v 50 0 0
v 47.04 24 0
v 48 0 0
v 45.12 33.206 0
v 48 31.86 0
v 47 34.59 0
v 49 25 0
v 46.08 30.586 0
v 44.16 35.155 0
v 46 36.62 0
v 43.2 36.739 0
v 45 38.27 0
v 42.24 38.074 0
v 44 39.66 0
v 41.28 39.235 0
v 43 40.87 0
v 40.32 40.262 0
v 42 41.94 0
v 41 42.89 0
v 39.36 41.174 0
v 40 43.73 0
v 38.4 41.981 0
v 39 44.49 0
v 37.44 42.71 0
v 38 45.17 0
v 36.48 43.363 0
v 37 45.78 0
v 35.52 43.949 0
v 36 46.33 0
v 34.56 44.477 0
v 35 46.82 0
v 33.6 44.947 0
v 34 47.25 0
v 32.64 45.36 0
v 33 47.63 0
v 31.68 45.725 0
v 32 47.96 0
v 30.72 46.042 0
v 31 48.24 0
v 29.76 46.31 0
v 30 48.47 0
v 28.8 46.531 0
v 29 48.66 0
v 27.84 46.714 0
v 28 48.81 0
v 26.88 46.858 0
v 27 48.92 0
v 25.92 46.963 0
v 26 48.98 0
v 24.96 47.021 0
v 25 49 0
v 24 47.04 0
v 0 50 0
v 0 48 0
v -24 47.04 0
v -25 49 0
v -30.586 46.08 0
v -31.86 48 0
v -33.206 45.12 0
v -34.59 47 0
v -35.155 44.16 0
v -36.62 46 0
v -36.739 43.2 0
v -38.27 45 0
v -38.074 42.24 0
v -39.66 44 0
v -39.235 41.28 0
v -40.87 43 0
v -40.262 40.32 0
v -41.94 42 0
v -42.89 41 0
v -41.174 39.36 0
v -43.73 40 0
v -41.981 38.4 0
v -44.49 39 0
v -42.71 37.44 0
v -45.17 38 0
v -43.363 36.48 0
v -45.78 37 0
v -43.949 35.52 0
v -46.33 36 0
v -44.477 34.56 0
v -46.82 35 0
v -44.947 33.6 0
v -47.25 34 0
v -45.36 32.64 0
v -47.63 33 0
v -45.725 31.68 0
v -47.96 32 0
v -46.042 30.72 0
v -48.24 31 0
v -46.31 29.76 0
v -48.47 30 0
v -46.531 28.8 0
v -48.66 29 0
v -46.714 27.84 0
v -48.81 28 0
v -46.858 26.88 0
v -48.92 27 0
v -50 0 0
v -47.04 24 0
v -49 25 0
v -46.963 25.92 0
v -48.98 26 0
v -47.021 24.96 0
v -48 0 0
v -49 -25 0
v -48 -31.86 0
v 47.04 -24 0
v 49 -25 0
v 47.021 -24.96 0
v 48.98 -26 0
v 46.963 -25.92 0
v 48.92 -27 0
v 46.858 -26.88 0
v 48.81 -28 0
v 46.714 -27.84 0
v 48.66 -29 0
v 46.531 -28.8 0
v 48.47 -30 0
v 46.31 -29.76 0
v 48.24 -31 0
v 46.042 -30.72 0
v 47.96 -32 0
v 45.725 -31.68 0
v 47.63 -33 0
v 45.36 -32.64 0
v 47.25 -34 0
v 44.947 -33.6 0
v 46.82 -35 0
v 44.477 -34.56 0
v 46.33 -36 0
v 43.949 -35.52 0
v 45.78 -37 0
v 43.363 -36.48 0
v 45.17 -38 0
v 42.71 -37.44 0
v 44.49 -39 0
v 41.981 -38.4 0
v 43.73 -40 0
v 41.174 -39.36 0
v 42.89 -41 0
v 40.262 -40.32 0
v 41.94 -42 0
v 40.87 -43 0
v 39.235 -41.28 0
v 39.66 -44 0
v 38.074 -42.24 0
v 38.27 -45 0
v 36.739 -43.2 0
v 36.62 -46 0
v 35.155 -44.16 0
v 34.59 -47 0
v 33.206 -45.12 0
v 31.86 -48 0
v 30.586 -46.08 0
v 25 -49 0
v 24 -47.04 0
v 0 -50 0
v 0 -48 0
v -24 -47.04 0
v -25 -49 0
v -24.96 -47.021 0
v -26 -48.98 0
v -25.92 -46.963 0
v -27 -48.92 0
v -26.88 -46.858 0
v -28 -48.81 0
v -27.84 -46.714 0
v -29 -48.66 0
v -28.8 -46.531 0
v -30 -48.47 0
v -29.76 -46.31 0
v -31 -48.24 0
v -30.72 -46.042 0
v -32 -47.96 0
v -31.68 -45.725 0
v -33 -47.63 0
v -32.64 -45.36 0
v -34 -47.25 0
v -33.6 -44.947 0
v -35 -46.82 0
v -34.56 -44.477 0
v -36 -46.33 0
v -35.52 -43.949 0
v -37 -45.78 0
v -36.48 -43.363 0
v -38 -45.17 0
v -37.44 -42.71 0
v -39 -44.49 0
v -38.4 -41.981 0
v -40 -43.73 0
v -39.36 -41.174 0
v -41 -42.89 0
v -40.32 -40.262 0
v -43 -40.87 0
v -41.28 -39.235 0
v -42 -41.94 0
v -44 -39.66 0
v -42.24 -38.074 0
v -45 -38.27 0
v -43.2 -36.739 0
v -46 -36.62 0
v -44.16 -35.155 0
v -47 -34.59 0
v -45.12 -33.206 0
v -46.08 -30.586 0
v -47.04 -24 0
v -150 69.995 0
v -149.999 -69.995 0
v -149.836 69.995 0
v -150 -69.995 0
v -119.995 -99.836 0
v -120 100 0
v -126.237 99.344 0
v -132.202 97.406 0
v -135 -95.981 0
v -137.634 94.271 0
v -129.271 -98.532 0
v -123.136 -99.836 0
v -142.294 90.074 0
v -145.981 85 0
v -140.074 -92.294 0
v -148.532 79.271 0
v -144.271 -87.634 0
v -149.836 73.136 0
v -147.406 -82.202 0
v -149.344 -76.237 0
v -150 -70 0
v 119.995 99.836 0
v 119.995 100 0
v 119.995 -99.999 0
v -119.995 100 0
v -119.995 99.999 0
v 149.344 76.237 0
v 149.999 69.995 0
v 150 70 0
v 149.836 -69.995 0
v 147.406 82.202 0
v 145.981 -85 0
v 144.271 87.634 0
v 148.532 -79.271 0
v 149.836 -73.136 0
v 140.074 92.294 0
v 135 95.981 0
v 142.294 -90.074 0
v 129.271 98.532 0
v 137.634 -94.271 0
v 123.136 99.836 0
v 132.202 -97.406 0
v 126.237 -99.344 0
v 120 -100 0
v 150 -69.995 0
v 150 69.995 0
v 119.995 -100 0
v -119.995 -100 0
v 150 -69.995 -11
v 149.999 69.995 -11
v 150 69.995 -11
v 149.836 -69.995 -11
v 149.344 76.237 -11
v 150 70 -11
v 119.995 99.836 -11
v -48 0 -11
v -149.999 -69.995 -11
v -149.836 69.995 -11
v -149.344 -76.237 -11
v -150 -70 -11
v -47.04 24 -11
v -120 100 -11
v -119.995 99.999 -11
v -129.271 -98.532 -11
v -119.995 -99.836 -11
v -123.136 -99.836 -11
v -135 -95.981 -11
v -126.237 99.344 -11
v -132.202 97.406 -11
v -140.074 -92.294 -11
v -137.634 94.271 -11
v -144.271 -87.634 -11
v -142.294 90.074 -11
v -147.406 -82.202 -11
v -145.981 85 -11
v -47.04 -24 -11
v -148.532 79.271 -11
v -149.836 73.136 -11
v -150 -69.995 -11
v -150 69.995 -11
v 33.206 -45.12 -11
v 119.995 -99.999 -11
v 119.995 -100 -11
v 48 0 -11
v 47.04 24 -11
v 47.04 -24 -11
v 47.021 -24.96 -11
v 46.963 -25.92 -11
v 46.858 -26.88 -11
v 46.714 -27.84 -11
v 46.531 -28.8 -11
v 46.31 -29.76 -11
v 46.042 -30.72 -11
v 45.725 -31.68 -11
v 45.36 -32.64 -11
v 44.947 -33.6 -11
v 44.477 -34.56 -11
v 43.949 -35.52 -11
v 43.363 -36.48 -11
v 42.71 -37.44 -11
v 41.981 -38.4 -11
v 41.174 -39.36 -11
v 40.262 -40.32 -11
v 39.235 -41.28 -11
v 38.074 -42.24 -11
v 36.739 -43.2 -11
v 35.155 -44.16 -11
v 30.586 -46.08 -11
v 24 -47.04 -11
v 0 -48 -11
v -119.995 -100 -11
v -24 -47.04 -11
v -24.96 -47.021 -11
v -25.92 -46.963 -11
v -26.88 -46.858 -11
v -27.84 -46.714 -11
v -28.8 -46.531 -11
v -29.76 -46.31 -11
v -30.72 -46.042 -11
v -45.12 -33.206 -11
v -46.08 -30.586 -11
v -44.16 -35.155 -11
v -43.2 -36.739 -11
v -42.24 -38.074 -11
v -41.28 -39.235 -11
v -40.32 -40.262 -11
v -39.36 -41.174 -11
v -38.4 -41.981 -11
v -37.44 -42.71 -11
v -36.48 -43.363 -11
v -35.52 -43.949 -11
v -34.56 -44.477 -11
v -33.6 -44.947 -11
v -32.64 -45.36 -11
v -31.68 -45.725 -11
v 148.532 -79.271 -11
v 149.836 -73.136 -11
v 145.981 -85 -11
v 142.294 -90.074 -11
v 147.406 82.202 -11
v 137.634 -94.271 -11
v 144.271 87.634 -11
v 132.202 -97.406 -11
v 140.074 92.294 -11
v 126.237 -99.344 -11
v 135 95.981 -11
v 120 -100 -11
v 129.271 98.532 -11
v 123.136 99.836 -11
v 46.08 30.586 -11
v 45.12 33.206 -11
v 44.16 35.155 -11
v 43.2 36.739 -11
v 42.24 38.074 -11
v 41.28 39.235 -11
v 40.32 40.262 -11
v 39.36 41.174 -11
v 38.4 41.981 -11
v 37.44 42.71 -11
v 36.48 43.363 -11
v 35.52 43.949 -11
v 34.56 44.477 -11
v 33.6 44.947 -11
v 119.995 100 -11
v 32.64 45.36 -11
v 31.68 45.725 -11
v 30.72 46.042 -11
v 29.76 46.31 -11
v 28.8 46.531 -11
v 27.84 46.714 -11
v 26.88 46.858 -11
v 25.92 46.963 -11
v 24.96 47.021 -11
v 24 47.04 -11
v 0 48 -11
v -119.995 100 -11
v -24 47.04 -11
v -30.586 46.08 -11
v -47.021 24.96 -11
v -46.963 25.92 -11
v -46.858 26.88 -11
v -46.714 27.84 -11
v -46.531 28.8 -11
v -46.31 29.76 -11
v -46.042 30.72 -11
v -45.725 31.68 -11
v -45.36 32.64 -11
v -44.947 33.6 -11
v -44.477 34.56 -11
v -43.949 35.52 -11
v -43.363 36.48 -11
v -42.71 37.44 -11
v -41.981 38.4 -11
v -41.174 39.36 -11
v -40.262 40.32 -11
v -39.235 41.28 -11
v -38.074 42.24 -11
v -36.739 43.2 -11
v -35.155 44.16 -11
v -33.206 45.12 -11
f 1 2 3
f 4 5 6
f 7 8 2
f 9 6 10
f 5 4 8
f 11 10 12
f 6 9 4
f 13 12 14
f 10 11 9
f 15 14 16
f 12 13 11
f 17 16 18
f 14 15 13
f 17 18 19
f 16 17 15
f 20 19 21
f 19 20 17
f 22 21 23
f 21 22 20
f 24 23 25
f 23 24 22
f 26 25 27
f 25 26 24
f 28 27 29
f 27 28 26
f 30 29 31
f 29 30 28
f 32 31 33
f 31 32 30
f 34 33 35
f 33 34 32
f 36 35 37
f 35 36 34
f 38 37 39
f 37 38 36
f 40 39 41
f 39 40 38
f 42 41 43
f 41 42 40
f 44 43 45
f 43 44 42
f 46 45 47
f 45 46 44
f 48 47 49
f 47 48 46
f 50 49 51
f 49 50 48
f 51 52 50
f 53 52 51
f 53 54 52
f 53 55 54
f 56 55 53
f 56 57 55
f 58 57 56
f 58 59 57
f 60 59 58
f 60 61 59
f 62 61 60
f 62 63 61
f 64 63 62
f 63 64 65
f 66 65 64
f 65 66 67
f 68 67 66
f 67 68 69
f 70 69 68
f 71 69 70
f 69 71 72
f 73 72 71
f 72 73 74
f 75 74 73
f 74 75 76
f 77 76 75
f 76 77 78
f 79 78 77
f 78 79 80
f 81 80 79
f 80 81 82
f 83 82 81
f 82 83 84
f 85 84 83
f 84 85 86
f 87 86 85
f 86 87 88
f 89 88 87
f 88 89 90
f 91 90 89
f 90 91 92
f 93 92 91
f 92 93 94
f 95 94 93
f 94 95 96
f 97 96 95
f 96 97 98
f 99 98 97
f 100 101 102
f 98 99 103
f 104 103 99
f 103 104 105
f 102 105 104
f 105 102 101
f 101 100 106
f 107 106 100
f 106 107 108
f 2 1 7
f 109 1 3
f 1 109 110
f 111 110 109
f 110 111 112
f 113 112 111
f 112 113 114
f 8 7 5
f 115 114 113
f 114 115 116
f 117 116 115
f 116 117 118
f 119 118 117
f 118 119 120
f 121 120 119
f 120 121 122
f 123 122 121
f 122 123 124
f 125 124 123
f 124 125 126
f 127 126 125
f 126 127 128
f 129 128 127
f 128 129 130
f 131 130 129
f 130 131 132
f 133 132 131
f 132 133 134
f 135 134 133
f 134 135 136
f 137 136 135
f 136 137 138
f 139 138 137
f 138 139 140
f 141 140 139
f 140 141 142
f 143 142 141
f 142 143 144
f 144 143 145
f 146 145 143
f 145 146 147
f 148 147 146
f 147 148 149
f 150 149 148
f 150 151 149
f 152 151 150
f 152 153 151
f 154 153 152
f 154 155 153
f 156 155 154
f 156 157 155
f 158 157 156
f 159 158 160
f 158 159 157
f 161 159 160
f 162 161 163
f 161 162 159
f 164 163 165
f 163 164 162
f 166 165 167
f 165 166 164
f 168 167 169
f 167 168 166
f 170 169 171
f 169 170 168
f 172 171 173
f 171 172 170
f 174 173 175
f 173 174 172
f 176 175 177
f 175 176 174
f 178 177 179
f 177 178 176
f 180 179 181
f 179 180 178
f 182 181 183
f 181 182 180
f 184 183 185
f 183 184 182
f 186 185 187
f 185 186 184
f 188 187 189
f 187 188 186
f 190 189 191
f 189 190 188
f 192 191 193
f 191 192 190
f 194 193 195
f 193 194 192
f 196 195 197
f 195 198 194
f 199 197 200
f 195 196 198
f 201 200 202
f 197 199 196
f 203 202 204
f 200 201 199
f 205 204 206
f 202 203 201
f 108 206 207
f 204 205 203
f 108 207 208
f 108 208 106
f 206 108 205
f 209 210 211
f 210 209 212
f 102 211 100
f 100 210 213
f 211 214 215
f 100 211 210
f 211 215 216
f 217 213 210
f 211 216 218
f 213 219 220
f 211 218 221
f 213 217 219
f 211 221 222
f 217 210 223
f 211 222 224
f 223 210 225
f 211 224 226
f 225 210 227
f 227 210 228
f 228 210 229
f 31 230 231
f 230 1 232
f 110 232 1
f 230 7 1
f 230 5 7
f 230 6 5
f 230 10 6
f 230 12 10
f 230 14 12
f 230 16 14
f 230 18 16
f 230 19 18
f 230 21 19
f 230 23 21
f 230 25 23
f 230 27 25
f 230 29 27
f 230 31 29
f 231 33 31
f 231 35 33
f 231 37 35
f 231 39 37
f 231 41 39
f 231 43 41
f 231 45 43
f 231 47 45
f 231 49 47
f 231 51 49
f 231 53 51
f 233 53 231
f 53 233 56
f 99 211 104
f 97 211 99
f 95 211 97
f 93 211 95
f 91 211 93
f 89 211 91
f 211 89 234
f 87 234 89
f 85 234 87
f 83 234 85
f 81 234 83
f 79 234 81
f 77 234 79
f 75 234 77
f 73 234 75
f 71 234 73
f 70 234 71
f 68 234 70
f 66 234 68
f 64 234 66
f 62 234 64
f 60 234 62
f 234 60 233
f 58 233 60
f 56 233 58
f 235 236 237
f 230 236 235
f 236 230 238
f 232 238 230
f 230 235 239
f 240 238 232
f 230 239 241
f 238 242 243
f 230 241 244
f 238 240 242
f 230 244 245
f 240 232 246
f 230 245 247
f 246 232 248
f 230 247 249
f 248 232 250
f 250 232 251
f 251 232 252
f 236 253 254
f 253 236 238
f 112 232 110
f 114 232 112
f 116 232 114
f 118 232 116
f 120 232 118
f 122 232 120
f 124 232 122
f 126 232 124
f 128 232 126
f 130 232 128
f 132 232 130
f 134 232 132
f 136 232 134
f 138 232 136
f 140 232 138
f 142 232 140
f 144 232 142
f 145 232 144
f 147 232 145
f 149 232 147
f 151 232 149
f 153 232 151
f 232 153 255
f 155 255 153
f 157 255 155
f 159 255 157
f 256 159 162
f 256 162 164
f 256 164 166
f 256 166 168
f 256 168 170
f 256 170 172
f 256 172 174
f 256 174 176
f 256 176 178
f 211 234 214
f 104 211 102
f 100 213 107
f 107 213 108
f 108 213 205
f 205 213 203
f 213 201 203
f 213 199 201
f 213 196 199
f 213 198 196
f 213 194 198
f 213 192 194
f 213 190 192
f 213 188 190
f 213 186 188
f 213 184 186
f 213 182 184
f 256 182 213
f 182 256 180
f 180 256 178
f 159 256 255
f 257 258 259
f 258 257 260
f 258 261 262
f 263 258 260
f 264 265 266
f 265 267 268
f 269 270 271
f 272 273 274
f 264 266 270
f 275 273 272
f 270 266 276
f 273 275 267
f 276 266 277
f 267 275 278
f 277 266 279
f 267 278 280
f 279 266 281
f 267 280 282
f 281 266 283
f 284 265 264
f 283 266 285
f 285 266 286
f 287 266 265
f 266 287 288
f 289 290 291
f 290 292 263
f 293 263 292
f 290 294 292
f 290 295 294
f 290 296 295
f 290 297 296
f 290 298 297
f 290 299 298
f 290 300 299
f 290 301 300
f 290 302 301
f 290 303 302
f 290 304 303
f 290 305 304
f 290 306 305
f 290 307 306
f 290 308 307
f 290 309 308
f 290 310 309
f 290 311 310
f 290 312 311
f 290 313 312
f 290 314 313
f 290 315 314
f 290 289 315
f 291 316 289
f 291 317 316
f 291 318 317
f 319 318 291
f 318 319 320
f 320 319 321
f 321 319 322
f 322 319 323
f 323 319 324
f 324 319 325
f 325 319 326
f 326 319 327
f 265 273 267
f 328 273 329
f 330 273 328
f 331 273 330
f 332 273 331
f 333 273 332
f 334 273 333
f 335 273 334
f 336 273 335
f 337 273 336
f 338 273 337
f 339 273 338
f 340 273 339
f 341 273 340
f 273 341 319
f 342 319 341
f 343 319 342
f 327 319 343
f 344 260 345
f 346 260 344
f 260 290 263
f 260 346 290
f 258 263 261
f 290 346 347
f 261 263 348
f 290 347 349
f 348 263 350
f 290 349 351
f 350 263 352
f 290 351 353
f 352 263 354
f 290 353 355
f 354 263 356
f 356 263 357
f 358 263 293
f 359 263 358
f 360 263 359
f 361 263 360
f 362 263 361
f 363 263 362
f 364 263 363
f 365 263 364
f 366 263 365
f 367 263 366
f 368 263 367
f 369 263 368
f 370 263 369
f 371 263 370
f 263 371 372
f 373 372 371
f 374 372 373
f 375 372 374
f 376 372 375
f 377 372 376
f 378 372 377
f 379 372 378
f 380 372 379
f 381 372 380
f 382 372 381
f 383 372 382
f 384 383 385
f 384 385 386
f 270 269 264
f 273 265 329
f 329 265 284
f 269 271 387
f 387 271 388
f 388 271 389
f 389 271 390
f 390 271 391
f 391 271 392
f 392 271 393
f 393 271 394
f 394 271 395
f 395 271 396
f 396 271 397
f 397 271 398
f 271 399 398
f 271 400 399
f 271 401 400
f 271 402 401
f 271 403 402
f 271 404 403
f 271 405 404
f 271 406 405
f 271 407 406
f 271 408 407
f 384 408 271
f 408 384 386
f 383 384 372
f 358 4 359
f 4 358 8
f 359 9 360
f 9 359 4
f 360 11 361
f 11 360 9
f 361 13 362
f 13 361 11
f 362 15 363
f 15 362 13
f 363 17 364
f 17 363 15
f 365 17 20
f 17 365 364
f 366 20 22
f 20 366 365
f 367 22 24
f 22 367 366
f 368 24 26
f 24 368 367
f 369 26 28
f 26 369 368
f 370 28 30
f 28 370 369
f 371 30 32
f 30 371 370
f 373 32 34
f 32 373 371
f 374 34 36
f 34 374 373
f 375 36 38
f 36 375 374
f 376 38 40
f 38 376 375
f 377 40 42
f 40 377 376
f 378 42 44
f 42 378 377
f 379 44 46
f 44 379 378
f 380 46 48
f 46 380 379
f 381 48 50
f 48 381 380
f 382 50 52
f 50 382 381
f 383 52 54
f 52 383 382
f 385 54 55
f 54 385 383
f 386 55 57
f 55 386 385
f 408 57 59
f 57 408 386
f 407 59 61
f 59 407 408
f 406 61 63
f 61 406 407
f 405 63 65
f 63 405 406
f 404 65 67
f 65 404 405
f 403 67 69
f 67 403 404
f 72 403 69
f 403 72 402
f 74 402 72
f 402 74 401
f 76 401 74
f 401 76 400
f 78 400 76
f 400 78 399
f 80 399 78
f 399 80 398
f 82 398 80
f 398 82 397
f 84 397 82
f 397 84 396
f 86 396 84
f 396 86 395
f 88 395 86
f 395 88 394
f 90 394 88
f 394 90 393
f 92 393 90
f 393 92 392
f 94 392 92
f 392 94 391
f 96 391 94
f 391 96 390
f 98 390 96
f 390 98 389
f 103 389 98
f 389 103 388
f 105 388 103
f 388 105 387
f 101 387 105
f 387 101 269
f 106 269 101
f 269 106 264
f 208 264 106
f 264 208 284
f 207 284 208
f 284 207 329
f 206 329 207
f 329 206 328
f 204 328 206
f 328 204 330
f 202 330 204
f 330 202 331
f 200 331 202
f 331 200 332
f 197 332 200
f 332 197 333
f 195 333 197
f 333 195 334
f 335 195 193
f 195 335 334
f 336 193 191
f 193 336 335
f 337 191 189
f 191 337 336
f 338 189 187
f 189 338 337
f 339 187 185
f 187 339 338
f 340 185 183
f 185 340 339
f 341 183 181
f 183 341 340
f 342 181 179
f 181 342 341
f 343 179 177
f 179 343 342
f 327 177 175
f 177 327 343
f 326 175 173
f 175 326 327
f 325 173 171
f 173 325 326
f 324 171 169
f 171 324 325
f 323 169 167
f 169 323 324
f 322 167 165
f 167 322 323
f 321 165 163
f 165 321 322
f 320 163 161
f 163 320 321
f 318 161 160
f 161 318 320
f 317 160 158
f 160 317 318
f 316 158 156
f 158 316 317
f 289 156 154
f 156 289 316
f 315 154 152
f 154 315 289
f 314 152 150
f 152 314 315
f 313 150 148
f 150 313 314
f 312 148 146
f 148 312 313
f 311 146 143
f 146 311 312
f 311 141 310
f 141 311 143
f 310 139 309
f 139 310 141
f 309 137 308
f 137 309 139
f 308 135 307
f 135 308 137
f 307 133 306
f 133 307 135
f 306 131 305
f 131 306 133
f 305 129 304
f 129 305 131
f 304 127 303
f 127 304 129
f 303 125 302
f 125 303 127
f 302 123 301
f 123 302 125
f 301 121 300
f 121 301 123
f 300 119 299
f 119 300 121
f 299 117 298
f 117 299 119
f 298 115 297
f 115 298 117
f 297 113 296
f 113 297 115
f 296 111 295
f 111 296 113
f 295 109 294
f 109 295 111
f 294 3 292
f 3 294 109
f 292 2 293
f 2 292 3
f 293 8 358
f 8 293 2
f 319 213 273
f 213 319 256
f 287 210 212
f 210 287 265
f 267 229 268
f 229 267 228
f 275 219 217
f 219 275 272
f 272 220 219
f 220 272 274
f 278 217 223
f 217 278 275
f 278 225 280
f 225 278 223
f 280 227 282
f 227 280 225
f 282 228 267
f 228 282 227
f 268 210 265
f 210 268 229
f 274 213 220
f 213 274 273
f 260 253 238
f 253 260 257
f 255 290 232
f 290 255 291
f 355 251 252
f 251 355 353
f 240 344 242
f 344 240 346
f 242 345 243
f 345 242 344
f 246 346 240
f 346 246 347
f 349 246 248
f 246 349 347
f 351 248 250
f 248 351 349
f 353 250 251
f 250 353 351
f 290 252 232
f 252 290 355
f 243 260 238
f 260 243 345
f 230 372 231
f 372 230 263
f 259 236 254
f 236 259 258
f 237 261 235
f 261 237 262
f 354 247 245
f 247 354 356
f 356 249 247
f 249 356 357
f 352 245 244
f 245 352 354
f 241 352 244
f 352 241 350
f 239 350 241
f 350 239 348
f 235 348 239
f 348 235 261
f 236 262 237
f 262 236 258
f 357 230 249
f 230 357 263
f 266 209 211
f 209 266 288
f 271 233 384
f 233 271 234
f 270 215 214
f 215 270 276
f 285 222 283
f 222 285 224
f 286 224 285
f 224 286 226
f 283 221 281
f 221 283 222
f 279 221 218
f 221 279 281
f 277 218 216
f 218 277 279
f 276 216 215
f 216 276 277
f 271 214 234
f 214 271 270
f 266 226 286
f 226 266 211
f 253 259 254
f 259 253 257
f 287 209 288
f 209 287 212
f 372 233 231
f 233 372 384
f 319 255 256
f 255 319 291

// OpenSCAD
// file: ecobee.scad
module ecobee_corner() {
    // The ecobee3 shape is a rounded(ish) square. It can be split up
    // into four quadrants. To generate the outline of the upper right
    // quadrant, start at [0, 50], and connect to the top edge of a 24mm
    // radius circle centered at [25, 25]. Follow the outline of that
    // circle until its y-value hits 25, and then connect to [50, 0]. 
    // Because OpenSCAD can't generate an array of points like this by
    // executing a function for each x-value, these points were generated
    // by a separate PHP script:
    // <?php
    // 
    // function y( $x ) {
    //     return ( 1/$x ) + 50;
    // }
    // 
    // $r = 24;
    // $h = 25;
    // $k = 25;
    // $a = 1;
    // $b = -2 * $k;
    // $points = array();
    // $points[] = '[0, 0]';
    // $points[] = '[0, 50]';
    // 
    // for ( $x = 25; $x <= 49; $x++ ) {
    //     $c = -($r * $r) + ($k * $k) + (($x - $h) * ($x - $h));
    // 
    //     $d = ($b*$b) - (4*$a*$c);
    // 
    //     $y = ( ( -$b + sqrt( $d ) ) / ( 2 * $a ) );
    // 
    //     $points[] = '[' . $x . ', ' . round( $y, 2 ) . ']';
    // }
    // 
    // $points[] = '[50, 0]';
    // 
    // echo '[ ' . join( ", ", $points ) . ' ]';
    points = [ [0, 0], [0, 50], [25, 49], [26, 48.98], [27, 48.92], [28, 48.81], [29, 48.66], [30, 48.47], [31, 48.24], [32, 47.96], [33, 47.63], [34, 47.25], [35, 46.82], [36, 46.33], [37, 45.78], [38, 45.17], [39, 44.49], [40, 43.73], [41, 42.89], [42, 41.94], [43, 40.87], [44, 39.66], [45, 38.27], [46, 36.62], [47, 34.59], [48, 31.86], [49, 25], [50, 0] ];
    
    polygon( points );
}

ecobee_height = 22;

/**
 * @param string mode "model", "convex", and "cutout".  "model" is the semi-realistic model. "convex" does not make any concave cuts out of the model. "cutout" does not make any curves along the faces.
 */
module ecobee3(mode="model") {
    // The top is very slightly rounded. Use the top sliver of a sphere to show this.
    // r=1252 was chosen because it creates a sphere with a 1mm vertical drop from the
    // center top to the edge of the ecobee unit.
    // Find the sphere that has a 1mm drop from the top center to 50mm from center.
    drop = 1;
    distance = 50;
    r = ((distance * distance) + (drop * drop)) / (2 * drop); // Extrapolated from x^2+y^2=r^2.
    intersection() {
        if ( mode != "cutout" ) {
            translate([0, 0, -r + (ecobee_height/2)]) sphere(r=r, $fa = 4);
        }
        linear_extrude(ecobee_height / 2) {
            union() {
                for ( i = [0:3] ) {
                    rotate([0, 0, 90 * i]) {
                        ecobee_corner();
                    }
                }
            }
        }
    }

    intersection() {
        // Expanding a r=200 shphere 3.25mm beyond the bottom of the plate is just about right to
        // make the middle 78mm flat, but have a curve along the edges that loses 2mm on the
        // outer 9mm of each side.
        if ( mode != "cutout" ) {
            translate([0, 0, 200 - (ecobee_height/2) - 3.25]) sphere(r=200, $fa=4);
        }
        // The bottom half is inset 2mm on each side, but with the same general shape as the top.
        scale([.96, .96, 1]) {
            translate([0, 0, -ecobee_height / 2]) {
                difference() {
                    linear_extrude(ecobee_height / 2) {
                        union() {
                            for ( i = [0:3] ) {
                                rotate([0, 0, 90 * i]) {
                                    ecobee_corner();
                                }
                            }
                        }
                    }
                    
                    // There's a cutout in the back with all of the pins and things in it that's about 68x36.
                    if ( mode == "model" ) {
                        cube([68,36,ecobee_height / 2], true);
                    }
                }
            }
        }
    }
}

/*
68x36 cutout in back
*/
ecobee3(mode="model");
// main file
use <ecobee.scad>;

plate_width = 300;
plate_height = 200;
plate_thickness = 11;
corner_radius = 30;

difference() {
    translate([0, 0, -plate_thickness/2]) cube( [plate_width, plate_height, plate_thickness], true );
    ecobee3(mode="cutout");
    
    // Round the corners.
    translate([-plate_width/2,-plate_height/2, -plate_thickness/2]) fillet(corner_radius, plate_thickness);
    translate([plate_width/2,-plate_height/2, -plate_thickness/2]) rotate([0,0,90]) fillet(corner_radius, plate_thickness);
    translate([plate_width/2,plate_height/2, -plate_thickness/2]) rotate([0,0,180]) fillet(corner_radius, plate_thickness);
    translate([-plate_width/2,plate_height/2, -plate_thickness/2]) rotate([0,0,270]) fillet(corner_radius, plate_thickness);


}

module fillet(r, h) {
    translate([r / 2, r / 2, 0])

        difference() {
            cube([r + 0.01, r + 0.01, h], center = true);

            translate([r/2, r/2, 0])
                cylinder(r = r, h = h + 1, center = true);

        }
}
